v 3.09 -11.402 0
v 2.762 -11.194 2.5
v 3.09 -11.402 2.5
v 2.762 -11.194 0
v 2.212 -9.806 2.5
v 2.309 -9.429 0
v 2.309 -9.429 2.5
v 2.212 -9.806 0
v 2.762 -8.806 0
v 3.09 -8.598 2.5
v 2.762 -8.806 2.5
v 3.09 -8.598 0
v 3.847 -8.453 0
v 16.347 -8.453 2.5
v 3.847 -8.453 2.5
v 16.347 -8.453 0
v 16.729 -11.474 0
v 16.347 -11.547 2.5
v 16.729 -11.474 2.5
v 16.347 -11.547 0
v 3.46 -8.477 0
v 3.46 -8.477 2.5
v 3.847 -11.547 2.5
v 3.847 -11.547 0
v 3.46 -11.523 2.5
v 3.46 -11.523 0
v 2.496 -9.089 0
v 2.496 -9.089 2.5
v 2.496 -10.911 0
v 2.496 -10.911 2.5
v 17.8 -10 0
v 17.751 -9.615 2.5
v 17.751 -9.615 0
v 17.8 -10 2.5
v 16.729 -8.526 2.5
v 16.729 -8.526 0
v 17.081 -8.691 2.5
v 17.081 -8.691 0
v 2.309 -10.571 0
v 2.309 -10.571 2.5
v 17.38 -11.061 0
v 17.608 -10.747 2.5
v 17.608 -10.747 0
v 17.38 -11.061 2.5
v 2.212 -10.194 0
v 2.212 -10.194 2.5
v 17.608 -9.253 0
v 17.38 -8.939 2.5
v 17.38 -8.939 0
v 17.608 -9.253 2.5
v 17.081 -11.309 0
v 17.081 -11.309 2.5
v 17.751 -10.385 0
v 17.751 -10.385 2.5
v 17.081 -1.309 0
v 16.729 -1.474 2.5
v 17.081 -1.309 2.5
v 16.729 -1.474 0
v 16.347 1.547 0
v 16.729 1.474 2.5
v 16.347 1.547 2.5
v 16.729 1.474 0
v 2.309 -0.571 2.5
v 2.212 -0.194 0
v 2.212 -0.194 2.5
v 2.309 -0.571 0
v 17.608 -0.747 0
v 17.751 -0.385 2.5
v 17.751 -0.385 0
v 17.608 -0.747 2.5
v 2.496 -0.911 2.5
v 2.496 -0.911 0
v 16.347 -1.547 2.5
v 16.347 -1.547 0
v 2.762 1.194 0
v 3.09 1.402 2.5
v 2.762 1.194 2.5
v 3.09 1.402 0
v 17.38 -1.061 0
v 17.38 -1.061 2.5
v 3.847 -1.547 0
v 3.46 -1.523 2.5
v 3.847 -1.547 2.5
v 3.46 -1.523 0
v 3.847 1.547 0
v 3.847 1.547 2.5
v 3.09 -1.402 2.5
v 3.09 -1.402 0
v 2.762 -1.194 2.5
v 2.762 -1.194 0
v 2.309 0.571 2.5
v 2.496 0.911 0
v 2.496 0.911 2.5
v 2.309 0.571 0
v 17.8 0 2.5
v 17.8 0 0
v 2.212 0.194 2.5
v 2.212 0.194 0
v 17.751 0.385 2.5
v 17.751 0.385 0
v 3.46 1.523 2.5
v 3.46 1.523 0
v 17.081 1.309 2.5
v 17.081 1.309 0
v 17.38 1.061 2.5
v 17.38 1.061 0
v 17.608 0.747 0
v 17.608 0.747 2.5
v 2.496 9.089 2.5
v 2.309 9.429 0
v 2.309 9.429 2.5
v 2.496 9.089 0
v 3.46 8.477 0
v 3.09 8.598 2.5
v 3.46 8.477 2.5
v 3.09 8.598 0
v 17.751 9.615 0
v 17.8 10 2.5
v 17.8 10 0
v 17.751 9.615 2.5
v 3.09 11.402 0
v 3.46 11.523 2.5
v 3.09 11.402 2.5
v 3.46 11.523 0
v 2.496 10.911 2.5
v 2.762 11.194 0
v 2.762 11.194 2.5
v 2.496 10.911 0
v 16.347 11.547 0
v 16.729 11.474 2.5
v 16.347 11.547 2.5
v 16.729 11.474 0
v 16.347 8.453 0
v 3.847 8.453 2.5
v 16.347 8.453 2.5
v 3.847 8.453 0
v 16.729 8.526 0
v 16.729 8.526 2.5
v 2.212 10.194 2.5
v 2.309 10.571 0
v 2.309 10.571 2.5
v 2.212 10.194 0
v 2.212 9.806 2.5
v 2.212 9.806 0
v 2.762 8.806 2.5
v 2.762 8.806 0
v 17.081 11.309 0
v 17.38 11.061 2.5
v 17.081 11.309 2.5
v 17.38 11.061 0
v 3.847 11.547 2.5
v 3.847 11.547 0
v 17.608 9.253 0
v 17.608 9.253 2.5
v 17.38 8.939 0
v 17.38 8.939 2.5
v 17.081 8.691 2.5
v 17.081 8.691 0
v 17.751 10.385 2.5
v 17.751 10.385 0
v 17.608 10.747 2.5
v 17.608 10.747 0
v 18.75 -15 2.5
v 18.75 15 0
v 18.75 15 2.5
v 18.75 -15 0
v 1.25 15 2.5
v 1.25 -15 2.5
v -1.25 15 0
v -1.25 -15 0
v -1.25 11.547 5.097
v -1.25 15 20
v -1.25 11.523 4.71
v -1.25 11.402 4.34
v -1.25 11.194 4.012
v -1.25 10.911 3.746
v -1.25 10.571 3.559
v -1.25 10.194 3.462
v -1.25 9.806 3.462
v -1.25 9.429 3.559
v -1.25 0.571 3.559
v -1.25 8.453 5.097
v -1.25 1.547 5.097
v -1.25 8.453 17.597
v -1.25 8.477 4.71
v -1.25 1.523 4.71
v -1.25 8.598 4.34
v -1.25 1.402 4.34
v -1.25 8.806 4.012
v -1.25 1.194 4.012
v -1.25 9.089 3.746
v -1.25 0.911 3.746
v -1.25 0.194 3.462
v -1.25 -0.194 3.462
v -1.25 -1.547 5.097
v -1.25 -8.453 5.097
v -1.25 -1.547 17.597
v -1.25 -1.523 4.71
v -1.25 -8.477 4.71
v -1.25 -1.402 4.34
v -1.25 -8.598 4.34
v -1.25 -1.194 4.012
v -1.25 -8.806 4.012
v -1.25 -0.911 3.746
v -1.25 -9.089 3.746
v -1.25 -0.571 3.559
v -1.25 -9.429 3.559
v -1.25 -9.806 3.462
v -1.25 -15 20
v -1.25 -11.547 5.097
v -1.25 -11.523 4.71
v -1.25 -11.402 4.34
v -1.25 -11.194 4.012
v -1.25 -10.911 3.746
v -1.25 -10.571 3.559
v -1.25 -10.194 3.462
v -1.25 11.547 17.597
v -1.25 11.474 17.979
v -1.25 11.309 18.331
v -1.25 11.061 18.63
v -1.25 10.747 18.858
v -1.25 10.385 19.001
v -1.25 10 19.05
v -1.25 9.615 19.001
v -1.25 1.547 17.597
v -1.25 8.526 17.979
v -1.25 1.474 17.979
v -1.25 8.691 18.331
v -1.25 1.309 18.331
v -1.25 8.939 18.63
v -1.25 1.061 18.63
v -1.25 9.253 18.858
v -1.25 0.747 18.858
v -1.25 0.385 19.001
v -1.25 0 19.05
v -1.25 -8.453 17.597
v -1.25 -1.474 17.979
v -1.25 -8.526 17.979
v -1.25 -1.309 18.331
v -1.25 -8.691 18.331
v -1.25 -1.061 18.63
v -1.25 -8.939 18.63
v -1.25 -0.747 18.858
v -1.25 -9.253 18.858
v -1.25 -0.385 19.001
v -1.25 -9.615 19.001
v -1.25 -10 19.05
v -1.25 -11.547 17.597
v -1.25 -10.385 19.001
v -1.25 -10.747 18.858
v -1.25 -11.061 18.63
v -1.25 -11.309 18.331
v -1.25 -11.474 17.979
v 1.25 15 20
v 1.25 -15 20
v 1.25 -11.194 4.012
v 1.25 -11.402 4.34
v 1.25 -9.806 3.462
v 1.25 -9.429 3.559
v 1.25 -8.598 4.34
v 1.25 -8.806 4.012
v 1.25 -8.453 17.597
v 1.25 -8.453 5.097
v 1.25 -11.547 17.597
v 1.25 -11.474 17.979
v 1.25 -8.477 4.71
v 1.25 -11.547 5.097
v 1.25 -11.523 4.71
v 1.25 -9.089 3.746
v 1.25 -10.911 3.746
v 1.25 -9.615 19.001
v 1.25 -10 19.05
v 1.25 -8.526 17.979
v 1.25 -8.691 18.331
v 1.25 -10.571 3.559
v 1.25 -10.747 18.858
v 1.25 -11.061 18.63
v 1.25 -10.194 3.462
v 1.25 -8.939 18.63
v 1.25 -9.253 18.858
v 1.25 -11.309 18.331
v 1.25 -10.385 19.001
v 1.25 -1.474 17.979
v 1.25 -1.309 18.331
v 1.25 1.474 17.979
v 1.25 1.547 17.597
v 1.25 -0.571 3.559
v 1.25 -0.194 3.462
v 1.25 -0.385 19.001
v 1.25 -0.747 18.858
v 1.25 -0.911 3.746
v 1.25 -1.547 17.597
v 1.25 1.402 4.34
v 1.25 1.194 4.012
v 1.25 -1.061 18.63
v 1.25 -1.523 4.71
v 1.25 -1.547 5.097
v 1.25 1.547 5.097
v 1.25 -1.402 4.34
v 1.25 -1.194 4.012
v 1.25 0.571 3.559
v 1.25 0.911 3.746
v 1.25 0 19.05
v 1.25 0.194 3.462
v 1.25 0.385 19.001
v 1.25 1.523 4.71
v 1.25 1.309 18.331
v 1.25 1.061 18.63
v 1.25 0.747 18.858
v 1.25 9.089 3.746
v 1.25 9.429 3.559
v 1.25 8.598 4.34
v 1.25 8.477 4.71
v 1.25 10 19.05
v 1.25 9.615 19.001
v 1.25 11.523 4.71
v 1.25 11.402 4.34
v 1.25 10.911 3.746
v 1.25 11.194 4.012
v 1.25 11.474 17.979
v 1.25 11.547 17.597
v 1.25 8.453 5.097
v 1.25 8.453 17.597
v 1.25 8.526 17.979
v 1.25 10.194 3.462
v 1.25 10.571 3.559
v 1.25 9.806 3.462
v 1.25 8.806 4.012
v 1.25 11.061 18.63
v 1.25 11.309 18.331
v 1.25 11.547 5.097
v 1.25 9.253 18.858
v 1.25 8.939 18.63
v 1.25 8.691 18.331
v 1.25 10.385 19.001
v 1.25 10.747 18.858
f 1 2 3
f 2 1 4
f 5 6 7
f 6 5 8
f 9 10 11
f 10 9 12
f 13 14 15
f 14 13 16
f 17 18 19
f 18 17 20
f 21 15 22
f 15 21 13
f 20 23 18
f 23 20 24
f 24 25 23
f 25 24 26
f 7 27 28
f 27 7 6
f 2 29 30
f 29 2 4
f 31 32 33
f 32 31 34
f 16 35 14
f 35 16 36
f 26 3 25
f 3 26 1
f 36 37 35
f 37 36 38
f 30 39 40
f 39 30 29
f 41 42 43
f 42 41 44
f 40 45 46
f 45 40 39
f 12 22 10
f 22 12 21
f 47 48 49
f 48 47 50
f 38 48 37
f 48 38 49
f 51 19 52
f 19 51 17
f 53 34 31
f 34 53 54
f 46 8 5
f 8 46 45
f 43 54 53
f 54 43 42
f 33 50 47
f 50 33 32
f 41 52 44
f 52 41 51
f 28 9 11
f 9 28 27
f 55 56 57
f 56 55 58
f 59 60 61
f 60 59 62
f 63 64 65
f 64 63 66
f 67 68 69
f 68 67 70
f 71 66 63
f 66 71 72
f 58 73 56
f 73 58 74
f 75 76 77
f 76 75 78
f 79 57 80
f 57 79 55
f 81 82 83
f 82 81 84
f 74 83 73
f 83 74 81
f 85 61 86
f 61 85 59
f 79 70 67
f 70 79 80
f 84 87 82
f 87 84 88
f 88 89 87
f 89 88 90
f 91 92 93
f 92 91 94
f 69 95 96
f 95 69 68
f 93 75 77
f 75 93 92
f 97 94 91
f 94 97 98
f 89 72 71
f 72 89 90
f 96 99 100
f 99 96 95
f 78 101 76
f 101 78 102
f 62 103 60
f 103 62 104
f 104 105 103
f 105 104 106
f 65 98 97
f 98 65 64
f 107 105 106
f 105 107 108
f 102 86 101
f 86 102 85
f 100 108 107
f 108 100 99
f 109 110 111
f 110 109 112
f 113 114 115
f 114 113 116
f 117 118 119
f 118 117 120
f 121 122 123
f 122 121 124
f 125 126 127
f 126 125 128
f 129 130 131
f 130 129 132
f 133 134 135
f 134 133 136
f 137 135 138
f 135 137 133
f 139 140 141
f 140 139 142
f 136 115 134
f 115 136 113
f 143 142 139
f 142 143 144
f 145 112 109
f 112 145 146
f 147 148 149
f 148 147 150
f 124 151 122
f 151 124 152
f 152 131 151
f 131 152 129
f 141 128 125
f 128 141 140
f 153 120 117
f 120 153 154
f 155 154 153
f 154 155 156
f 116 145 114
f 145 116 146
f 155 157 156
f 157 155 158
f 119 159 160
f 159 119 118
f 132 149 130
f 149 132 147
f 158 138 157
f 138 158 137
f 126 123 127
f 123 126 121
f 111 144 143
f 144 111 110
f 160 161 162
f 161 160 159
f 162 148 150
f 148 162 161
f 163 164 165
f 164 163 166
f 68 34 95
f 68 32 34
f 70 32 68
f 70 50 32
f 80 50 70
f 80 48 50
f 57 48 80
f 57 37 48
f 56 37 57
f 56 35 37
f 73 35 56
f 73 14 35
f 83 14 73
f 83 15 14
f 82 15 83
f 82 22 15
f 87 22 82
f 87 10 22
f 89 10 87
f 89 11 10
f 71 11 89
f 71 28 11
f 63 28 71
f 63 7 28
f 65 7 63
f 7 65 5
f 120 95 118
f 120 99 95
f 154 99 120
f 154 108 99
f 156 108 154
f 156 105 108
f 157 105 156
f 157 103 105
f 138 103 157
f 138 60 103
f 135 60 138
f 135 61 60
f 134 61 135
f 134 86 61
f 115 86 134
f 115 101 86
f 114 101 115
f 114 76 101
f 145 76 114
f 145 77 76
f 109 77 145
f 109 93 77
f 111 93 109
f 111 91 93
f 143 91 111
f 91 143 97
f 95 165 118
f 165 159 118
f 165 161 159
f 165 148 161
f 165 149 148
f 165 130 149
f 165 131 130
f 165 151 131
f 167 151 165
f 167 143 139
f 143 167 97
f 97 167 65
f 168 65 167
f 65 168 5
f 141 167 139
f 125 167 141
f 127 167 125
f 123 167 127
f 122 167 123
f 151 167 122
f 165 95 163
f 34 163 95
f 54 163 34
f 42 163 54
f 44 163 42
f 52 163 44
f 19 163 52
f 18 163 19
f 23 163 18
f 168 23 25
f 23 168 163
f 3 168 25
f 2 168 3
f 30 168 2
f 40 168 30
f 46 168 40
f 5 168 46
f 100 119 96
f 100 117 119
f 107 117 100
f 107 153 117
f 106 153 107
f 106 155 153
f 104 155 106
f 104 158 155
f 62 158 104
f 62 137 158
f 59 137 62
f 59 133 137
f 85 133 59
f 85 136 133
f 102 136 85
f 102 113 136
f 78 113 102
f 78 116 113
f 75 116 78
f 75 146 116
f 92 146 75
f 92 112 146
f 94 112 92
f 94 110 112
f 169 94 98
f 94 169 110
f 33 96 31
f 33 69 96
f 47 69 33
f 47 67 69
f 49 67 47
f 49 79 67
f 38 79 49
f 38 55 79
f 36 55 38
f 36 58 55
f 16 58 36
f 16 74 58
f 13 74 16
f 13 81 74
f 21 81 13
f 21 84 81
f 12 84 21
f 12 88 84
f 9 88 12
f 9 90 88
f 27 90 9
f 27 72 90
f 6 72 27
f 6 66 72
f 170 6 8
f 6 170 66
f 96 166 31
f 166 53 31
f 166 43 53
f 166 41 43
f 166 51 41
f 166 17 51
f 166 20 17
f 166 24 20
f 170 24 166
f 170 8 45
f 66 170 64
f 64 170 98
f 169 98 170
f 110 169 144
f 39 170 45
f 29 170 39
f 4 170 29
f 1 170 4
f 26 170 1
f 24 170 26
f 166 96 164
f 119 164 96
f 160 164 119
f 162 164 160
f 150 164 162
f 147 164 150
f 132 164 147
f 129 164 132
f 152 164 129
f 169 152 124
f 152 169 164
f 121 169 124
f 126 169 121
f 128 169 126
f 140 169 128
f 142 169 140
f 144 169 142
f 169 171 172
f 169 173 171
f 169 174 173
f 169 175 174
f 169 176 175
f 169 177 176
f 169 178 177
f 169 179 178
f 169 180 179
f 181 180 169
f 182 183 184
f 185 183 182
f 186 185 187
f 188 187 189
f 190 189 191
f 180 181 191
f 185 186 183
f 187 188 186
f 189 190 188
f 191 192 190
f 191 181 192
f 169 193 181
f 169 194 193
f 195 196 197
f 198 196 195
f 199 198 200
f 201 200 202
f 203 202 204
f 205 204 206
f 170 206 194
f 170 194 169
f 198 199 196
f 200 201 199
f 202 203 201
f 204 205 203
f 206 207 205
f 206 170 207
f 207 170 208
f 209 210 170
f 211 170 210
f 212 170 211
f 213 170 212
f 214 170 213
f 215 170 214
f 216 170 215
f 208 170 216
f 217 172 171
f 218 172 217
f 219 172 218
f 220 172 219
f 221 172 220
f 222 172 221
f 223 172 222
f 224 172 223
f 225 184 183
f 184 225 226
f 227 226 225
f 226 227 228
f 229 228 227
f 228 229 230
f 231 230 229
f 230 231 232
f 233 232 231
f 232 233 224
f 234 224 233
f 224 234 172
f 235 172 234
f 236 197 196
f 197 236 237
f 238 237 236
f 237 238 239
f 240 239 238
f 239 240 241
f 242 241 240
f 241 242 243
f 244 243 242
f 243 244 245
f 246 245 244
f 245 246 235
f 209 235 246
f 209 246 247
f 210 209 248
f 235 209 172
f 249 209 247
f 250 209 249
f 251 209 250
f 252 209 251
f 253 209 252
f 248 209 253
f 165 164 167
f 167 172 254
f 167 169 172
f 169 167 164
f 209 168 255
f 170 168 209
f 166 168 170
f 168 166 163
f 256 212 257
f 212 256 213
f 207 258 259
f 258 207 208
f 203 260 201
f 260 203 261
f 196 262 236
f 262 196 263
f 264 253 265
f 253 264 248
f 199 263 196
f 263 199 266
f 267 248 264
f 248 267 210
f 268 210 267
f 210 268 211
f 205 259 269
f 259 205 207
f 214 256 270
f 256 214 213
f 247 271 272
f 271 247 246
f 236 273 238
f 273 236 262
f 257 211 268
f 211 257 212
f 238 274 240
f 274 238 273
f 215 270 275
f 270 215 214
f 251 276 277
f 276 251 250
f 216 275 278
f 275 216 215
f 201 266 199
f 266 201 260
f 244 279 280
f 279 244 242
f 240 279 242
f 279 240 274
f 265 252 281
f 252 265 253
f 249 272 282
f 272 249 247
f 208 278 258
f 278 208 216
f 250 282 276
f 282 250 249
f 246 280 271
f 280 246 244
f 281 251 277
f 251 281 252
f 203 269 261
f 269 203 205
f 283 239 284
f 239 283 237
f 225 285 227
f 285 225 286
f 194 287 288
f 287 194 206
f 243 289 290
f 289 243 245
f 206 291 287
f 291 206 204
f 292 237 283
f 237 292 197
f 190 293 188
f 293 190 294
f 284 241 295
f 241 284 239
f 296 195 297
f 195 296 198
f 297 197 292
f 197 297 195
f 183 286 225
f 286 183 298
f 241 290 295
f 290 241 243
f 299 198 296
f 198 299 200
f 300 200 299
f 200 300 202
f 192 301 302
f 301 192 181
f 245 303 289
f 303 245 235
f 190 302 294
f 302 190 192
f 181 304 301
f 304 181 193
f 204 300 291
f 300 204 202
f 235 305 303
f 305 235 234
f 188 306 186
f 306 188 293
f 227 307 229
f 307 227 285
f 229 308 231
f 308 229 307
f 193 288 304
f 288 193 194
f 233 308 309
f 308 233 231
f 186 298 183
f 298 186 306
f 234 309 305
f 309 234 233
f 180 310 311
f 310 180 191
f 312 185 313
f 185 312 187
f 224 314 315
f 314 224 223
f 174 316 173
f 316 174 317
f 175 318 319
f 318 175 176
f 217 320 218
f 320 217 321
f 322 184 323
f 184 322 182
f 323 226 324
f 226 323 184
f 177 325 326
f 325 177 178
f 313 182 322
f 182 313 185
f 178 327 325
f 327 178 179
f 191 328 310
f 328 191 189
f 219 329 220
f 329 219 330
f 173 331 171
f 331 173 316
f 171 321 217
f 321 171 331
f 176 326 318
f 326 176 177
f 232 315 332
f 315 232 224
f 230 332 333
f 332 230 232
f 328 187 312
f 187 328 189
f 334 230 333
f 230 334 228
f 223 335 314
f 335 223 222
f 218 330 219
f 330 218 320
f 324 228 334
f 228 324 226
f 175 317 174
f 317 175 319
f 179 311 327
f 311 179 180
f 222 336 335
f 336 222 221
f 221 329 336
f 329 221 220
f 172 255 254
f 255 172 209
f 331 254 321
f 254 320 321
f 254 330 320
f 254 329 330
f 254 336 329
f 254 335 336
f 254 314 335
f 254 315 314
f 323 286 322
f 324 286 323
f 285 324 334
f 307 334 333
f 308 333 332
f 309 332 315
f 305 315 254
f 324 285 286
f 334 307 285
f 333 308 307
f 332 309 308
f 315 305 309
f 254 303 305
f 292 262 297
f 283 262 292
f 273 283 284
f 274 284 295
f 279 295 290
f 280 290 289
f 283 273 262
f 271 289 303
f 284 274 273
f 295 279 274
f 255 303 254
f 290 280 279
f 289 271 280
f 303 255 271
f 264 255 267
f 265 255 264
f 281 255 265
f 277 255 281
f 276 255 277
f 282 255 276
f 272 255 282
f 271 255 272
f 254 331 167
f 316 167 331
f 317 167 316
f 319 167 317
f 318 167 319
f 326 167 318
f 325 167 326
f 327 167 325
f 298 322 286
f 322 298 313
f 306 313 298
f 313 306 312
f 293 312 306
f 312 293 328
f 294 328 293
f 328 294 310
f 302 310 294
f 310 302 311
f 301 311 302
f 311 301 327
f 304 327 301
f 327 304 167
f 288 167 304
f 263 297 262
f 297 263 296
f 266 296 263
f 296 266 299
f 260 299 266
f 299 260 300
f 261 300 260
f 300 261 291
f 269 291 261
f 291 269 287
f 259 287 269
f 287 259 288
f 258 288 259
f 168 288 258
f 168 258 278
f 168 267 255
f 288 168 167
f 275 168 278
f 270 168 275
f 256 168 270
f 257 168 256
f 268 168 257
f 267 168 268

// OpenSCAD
// file: dimensions.scad
axle_top_diameter = 19.95;
axle_bottom_diameter = 21.4;
axle_top_height = 9.4;
axle_bottom_height = 3 + 5.2 + 4 + 2;
axle_hole_diameter = 13.2;
bottom_plate_height = 3;
rim_diameter = 66;
rim_height = 4.8;
rim_thickness = 1.5;
wheel_screw_diameter = 2;
wheel_thickness = 2;
o_ring_inner_diameter = 106;
o_ring_cross_section_diameter = 6;

bevel_gear_to_cup_fixing_thickness = 1.5;
bottom_bevel_gear_thickness = 4;
bevel_gear_backlash = 0.005;

// Detachable tools related constants
tool_magnet_width = 4;
tool_magnet_height = 4;
tool_magnet_length = 15;
tool_wall_thickness = 1.5;
tool_length = 40;
tool_diameter = 10;
tool_hole_diameter = 2;
tool_angle = 20;
tool_magnet_distance_from_center = 78.2 / 2 + tool_wall_thickness;
tool_distance_between_magnets = 18;
tool_angle_between_magnets = tool_distance_between_magnets * 360 / (2 * PI * tool_magnet_distance_from_center);
tool_count = 3;
tool_pin_diameter = 2;
tool_connecting_plate_width = 30;
tool_connecting_plate_length = 22;
tool_connecting_plate_thickness = 2.5;
tool_connecting_plate_screw_diameter = 3.1;
// main file
include <dimensions.scad>

module plate(
        width = 30,
        length = 20) {
    translate([length / 2 - tool_connecting_plate_thickness / 2, 0, tool_connecting_plate_thickness / 2]) {
        difference() {
            cube([length, width, tool_connecting_plate_thickness], center = true);
            for (i = [-1:1]) {
                hull() {
                    translate([-length / 2 + tool_connecting_plate_thickness * 2, i * 10, 0]) {
                        cylinder(h = tool_connecting_plate_thickness + 1, d = tool_connecting_plate_screw_diameter, center = true, $fn = 25);
                    }
                    translate([length / 2 - tool_connecting_plate_thickness, i * 10, 0]) {
                        cylinder(h = tool_connecting_plate_thickness + 1, d = tool_connecting_plate_screw_diameter, center = true, $fn = 25);
                    }
                }
            }
        }
    }
}

module three_hole_angle() {
    plate();
    translate([0, 0, tool_connecting_plate_thickness / 2]) {
        rotate([0, -90, 0]) {
            translate([0, 0, -tool_connecting_plate_thickness / 2]) {
                plate();
            }
        }
    }
}

three_hole_angle();
